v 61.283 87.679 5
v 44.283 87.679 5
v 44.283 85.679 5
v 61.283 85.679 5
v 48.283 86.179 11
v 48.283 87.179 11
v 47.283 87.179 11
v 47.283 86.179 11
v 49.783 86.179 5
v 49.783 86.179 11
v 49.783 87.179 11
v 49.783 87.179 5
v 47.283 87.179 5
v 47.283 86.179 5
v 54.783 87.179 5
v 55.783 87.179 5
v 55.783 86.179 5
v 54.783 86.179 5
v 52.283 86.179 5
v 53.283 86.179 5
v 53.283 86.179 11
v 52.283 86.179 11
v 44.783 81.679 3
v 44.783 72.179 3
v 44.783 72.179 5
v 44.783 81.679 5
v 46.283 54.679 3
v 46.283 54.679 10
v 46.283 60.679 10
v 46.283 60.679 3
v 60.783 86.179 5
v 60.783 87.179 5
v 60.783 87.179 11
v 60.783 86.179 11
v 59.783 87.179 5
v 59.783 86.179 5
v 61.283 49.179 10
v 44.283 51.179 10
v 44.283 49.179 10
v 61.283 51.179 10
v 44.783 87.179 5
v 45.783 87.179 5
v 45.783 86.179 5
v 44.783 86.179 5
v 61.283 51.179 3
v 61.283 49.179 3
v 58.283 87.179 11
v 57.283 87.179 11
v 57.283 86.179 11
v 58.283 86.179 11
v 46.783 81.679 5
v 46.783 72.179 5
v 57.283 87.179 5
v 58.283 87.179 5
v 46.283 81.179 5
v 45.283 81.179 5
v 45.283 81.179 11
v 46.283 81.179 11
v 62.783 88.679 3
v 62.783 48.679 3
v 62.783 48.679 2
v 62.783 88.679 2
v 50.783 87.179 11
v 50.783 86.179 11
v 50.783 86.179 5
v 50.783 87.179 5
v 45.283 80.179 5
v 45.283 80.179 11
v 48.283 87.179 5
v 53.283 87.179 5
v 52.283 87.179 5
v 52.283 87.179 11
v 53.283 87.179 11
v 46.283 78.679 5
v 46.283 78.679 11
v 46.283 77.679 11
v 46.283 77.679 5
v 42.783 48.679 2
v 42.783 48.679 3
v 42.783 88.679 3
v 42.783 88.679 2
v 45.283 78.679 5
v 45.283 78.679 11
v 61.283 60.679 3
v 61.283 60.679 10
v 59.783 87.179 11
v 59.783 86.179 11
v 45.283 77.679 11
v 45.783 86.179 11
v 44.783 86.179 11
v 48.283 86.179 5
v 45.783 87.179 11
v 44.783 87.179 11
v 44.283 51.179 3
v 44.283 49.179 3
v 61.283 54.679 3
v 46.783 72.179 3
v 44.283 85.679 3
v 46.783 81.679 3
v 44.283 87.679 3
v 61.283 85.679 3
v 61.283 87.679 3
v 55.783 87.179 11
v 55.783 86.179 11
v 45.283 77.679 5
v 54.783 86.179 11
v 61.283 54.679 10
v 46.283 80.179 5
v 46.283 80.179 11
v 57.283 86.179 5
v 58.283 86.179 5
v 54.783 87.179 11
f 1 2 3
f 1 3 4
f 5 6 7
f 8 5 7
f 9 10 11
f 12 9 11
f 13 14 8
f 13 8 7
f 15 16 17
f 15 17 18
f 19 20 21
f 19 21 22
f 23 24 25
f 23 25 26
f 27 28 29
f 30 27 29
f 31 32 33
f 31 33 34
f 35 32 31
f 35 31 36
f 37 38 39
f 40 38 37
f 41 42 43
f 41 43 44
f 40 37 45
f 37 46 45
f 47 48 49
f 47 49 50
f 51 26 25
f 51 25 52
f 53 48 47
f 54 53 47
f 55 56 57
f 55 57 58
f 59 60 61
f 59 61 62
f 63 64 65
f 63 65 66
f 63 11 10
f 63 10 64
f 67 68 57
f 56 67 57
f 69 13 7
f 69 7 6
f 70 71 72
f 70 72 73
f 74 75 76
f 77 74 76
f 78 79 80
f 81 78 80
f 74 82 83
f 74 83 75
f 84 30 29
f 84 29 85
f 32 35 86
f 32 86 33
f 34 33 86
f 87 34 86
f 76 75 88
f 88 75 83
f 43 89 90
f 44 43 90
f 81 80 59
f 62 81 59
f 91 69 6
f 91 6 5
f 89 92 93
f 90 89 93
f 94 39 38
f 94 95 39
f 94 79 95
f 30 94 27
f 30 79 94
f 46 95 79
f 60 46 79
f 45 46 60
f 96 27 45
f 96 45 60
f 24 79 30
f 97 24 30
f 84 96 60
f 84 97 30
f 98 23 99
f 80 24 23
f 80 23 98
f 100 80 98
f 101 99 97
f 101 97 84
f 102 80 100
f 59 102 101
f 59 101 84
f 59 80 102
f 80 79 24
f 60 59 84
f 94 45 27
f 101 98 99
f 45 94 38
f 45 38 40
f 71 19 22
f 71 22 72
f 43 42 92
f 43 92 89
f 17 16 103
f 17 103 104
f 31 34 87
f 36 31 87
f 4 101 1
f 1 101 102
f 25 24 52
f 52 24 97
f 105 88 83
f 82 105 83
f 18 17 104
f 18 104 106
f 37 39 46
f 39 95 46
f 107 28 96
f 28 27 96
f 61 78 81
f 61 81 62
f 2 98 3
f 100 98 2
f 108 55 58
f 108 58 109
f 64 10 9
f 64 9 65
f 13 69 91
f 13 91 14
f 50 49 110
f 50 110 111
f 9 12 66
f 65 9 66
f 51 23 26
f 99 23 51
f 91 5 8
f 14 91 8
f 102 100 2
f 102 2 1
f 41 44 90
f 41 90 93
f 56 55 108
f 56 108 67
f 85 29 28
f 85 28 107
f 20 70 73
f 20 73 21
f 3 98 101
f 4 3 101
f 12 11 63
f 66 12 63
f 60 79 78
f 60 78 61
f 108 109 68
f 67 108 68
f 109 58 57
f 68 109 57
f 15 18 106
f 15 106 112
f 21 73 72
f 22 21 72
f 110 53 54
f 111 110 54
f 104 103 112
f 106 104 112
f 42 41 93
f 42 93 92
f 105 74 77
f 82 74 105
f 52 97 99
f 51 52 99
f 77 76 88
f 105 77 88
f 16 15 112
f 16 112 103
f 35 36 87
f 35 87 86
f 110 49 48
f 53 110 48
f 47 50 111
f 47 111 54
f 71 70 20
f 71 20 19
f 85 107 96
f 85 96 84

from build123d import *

# Parameters (mm, degrees)
SKETCH2_W              = 17.000000924
SKETCH2_H              = 1.999996603
BOSS_EXTRUDE9_DEPTH    = 2
SKETCH2_H_2            = 2.000004053
BOSS_EXTRUDE9_2_DEPTH  = 2
SKETCH2_W_2            = 2.000000328
SKETCH2_H_3            = 9.4999969
BOSS_EXTRUDE9_3_DEPTH  = 2
SKETCH2_W_3            = 15.000000596
SKETCH2_H_4            = 5.999997258
BOSS_EXTRUDE9_4_DEPTH  = 2
BOSS_EXTRUDE11_DEPTH   = 6
BOSS_EXTRUDE11_2_DEPTH = 6
SKETCH3_W              = 1.000002027
SKETCH3_H              = 1.000002027
BOSS_EXTRUDE11_3_DEPTH = 6
BOSS_EXTRUDE11_4_DEPTH = 6
BOSS_EXTRUDE11_5_DEPTH = 6
BOSS_EXTRUDE11_6_DEPTH = 6
BOSS_EXTRUDE11_7_DEPTH = 6
BOSS_EXTRUDE11_8_DEPTH = 6
BOSS_EXTRUDE11_9_DEPTH = 6
SKETCH1_W              = 20.000003279
SKETCH1_H              = 40.000006557
BOSS_EXTRUDE12_DEPTH   = 1
MOVE_FACE1_BY          = 5
MOVE_FACE1_2_BY        = 5


# Read off the part's stored shape, not the designer's step: Imported1
with BuildPart() as part:
    # Sketch2 → Boss-Extrude9 (new body)
    with BuildSketch(Plane.XY.offset(3.000000957)):
        with Locations((52.782641724, 50.179485232)):
            Rectangle(SKETCH2_W, SKETCH2_H)
    extrude(amount=BOSS_EXTRUDE9_DEPTH)



with BuildPart() as body_2:
    # Sketch2 → Boss-Extrude9 2 (new body)
    with BuildSketch(Plane.XY.offset(3.000000957)):
        with Locations((52.782641724, 86.679488421)):
            Rectangle(SKETCH2_W, SKETCH2_H_2)
    extrude(amount=BOSS_EXTRUDE9_2_DEPTH)


with BuildPart() as body_3:
    # Sketch2 → Boss-Extrude9 3 (new body)
    with BuildSketch(Plane.XY.offset(3.000000957)):
        with Locations((45.782642439, 76.929487288)):
            Rectangle(SKETCH2_W_2, SKETCH2_H_3)
    extrude(amount=BOSS_EXTRUDE9_3_DEPTH)


with BuildPart() as body_4:
    # Sketch2 → Boss-Extrude9 4 (new body)
    with BuildSketch(Plane.XY.offset(3.000000957)):
        with Locations((53.782641888, 57.67948553)):
            Rectangle(SKETCH2_W_3, SKETCH2_H_4)
    extrude(amount=BOSS_EXTRUDE9_4_DEPTH)


with BuildPart() as body_5:
    # Sketch3 → Boss-Extrude11 (new body)
    with BuildSketch(Plane.XY.offset(5.000000957)):
        Polygon((44.782642275, 87.179489434), (45.782644302, 87.179489434), (45.782640576, 86.179487407), (44.782642275, 86.179487407), align=None)
    extrude(amount=BOSS_EXTRUDE11_DEPTH)


with BuildPart() as body_6:
    # Sketch3 → Boss-Extrude11 2 (new body)
    with BuildSketch(Plane.XY.offset(5.000000957)):
        Polygon((47.282643616, 87.179489434), (48.282645643, 87.179489434), (48.282641917, 86.179487407), (47.282643616, 86.179487407), align=None)
    extrude(amount=BOSS_EXTRUDE11_2_DEPTH)


with BuildPart() as body_7:
    # Sketch3 → Boss-Extrude11 3 (new body)
    with BuildSketch(Plane.XY.offset(5.000000957)):
        with Locations((50.282642245, 86.679488421)):
            Rectangle(SKETCH3_W, SKETCH3_H)
    extrude(amount=BOSS_EXTRUDE11_3_DEPTH)


with BuildPart() as body_8:
    # Sketch3 → Boss-Extrude11 4 (new body)
    with BuildSketch(Plane.XY.offset(5.000000957)):
        Polygon((52.282642573, 87.179489434), (53.2826446, 87.179489434), (53.282640874, 86.179487407), (52.282642573, 86.179487407), align=None)
    extrude(amount=BOSS_EXTRUDE11_4_DEPTH)


with BuildPart() as body_9:
    # Sketch3 → Boss-Extrude11 5 (new body)
    with BuildSketch(Plane.XY.offset(5.000000957)):
        Polygon((54.782643914, 87.179489434), (55.782645941, 87.179489434), (55.782642215, 86.179487407), (54.782643914, 86.179487407), align=None)
    extrude(amount=BOSS_EXTRUDE11_5_DEPTH)


with BuildPart() as body_10:
    # Sketch3 → Boss-Extrude11 6 (new body)
    with BuildSketch(Plane.XY.offset(5.000000957)):
        with Locations((57.782642544, 86.679488421)):
            Rectangle(SKETCH3_W, SKETCH3_H)
    extrude(amount=BOSS_EXTRUDE11_6_DEPTH)


with BuildPart() as body_11:
    # Sketch3 → Boss-Extrude11 7 (new body)
    with BuildSketch(Plane.XY.offset(5.000000957)):
        Polygon((59.782642871, 87.179489434), (60.782644898, 87.179489434), (60.782641172, 86.179487407), (59.782642871, 86.179487407), align=None)
    extrude(amount=BOSS_EXTRUDE11_7_DEPTH)


with BuildPart() as body_12:
    # Sketch3 → Boss-Extrude11 8 (new body)
    with BuildSketch(Plane.XY.offset(5.000000957)):
        Polygon((45.282643288, 81.179492176), (46.282645315, 81.179492176), (46.28264159, 80.179490149), (45.282643288, 80.179490149), align=None)
    extrude(amount=BOSS_EXTRUDE11_8_DEPTH)


with BuildPart() as body_13:
    # Sketch3 → Boss-Extrude11 9 (new body)
    with BuildSketch(Plane.XY.offset(5.000000957)):
        Polygon((45.282643288, 78.679487109), (46.282637864, 78.679487109), (46.28264159, 77.679492533), (45.282643288, 77.679492533), align=None)
    extrude(amount=BOSS_EXTRUDE11_9_DEPTH)


with BuildPart() as part_1:
    add(part.part)

    add(body_2.part)  # Boss-Extrude12 merges body 2

    add(body_3.part)  # Boss-Extrude12 merges body 3

    add(body_4.part)  # Boss-Extrude12 merges body 4
    # Sketch1 → Boss-Extrude12 (add)
    with BuildSketch(Plane.XY.offset(3.000000957)):
        with Locations((52.782643587, 68.679489195)):
            Rectangle(SKETCH1_W, SKETCH1_H)
    extrude(amount=-BOSS_EXTRUDE12_DEPTH)

    # Move Face1: a face moved outward by 5.0
    extrude(part_1.faces().sort_by_distance((52.782641724, 50.179485232, 5.000000957))[0], amount=MOVE_FACE1_BY, dir=(0, 0, 1))

    # Move Face1 2: a face moved outward by 5.0
    extrude(part_1.faces().sort_by_distance((53.782641888, 57.67948553, 5.000000957))[0], amount=MOVE_FACE1_2_BY, dir=(0, 0, 1))


solid = Compound([body_5.part, body_6.part, body_7.part, body_8.part, body_9.part, body_10.part, body_11.part, body_12.part, body_13.part, part_1.part])
